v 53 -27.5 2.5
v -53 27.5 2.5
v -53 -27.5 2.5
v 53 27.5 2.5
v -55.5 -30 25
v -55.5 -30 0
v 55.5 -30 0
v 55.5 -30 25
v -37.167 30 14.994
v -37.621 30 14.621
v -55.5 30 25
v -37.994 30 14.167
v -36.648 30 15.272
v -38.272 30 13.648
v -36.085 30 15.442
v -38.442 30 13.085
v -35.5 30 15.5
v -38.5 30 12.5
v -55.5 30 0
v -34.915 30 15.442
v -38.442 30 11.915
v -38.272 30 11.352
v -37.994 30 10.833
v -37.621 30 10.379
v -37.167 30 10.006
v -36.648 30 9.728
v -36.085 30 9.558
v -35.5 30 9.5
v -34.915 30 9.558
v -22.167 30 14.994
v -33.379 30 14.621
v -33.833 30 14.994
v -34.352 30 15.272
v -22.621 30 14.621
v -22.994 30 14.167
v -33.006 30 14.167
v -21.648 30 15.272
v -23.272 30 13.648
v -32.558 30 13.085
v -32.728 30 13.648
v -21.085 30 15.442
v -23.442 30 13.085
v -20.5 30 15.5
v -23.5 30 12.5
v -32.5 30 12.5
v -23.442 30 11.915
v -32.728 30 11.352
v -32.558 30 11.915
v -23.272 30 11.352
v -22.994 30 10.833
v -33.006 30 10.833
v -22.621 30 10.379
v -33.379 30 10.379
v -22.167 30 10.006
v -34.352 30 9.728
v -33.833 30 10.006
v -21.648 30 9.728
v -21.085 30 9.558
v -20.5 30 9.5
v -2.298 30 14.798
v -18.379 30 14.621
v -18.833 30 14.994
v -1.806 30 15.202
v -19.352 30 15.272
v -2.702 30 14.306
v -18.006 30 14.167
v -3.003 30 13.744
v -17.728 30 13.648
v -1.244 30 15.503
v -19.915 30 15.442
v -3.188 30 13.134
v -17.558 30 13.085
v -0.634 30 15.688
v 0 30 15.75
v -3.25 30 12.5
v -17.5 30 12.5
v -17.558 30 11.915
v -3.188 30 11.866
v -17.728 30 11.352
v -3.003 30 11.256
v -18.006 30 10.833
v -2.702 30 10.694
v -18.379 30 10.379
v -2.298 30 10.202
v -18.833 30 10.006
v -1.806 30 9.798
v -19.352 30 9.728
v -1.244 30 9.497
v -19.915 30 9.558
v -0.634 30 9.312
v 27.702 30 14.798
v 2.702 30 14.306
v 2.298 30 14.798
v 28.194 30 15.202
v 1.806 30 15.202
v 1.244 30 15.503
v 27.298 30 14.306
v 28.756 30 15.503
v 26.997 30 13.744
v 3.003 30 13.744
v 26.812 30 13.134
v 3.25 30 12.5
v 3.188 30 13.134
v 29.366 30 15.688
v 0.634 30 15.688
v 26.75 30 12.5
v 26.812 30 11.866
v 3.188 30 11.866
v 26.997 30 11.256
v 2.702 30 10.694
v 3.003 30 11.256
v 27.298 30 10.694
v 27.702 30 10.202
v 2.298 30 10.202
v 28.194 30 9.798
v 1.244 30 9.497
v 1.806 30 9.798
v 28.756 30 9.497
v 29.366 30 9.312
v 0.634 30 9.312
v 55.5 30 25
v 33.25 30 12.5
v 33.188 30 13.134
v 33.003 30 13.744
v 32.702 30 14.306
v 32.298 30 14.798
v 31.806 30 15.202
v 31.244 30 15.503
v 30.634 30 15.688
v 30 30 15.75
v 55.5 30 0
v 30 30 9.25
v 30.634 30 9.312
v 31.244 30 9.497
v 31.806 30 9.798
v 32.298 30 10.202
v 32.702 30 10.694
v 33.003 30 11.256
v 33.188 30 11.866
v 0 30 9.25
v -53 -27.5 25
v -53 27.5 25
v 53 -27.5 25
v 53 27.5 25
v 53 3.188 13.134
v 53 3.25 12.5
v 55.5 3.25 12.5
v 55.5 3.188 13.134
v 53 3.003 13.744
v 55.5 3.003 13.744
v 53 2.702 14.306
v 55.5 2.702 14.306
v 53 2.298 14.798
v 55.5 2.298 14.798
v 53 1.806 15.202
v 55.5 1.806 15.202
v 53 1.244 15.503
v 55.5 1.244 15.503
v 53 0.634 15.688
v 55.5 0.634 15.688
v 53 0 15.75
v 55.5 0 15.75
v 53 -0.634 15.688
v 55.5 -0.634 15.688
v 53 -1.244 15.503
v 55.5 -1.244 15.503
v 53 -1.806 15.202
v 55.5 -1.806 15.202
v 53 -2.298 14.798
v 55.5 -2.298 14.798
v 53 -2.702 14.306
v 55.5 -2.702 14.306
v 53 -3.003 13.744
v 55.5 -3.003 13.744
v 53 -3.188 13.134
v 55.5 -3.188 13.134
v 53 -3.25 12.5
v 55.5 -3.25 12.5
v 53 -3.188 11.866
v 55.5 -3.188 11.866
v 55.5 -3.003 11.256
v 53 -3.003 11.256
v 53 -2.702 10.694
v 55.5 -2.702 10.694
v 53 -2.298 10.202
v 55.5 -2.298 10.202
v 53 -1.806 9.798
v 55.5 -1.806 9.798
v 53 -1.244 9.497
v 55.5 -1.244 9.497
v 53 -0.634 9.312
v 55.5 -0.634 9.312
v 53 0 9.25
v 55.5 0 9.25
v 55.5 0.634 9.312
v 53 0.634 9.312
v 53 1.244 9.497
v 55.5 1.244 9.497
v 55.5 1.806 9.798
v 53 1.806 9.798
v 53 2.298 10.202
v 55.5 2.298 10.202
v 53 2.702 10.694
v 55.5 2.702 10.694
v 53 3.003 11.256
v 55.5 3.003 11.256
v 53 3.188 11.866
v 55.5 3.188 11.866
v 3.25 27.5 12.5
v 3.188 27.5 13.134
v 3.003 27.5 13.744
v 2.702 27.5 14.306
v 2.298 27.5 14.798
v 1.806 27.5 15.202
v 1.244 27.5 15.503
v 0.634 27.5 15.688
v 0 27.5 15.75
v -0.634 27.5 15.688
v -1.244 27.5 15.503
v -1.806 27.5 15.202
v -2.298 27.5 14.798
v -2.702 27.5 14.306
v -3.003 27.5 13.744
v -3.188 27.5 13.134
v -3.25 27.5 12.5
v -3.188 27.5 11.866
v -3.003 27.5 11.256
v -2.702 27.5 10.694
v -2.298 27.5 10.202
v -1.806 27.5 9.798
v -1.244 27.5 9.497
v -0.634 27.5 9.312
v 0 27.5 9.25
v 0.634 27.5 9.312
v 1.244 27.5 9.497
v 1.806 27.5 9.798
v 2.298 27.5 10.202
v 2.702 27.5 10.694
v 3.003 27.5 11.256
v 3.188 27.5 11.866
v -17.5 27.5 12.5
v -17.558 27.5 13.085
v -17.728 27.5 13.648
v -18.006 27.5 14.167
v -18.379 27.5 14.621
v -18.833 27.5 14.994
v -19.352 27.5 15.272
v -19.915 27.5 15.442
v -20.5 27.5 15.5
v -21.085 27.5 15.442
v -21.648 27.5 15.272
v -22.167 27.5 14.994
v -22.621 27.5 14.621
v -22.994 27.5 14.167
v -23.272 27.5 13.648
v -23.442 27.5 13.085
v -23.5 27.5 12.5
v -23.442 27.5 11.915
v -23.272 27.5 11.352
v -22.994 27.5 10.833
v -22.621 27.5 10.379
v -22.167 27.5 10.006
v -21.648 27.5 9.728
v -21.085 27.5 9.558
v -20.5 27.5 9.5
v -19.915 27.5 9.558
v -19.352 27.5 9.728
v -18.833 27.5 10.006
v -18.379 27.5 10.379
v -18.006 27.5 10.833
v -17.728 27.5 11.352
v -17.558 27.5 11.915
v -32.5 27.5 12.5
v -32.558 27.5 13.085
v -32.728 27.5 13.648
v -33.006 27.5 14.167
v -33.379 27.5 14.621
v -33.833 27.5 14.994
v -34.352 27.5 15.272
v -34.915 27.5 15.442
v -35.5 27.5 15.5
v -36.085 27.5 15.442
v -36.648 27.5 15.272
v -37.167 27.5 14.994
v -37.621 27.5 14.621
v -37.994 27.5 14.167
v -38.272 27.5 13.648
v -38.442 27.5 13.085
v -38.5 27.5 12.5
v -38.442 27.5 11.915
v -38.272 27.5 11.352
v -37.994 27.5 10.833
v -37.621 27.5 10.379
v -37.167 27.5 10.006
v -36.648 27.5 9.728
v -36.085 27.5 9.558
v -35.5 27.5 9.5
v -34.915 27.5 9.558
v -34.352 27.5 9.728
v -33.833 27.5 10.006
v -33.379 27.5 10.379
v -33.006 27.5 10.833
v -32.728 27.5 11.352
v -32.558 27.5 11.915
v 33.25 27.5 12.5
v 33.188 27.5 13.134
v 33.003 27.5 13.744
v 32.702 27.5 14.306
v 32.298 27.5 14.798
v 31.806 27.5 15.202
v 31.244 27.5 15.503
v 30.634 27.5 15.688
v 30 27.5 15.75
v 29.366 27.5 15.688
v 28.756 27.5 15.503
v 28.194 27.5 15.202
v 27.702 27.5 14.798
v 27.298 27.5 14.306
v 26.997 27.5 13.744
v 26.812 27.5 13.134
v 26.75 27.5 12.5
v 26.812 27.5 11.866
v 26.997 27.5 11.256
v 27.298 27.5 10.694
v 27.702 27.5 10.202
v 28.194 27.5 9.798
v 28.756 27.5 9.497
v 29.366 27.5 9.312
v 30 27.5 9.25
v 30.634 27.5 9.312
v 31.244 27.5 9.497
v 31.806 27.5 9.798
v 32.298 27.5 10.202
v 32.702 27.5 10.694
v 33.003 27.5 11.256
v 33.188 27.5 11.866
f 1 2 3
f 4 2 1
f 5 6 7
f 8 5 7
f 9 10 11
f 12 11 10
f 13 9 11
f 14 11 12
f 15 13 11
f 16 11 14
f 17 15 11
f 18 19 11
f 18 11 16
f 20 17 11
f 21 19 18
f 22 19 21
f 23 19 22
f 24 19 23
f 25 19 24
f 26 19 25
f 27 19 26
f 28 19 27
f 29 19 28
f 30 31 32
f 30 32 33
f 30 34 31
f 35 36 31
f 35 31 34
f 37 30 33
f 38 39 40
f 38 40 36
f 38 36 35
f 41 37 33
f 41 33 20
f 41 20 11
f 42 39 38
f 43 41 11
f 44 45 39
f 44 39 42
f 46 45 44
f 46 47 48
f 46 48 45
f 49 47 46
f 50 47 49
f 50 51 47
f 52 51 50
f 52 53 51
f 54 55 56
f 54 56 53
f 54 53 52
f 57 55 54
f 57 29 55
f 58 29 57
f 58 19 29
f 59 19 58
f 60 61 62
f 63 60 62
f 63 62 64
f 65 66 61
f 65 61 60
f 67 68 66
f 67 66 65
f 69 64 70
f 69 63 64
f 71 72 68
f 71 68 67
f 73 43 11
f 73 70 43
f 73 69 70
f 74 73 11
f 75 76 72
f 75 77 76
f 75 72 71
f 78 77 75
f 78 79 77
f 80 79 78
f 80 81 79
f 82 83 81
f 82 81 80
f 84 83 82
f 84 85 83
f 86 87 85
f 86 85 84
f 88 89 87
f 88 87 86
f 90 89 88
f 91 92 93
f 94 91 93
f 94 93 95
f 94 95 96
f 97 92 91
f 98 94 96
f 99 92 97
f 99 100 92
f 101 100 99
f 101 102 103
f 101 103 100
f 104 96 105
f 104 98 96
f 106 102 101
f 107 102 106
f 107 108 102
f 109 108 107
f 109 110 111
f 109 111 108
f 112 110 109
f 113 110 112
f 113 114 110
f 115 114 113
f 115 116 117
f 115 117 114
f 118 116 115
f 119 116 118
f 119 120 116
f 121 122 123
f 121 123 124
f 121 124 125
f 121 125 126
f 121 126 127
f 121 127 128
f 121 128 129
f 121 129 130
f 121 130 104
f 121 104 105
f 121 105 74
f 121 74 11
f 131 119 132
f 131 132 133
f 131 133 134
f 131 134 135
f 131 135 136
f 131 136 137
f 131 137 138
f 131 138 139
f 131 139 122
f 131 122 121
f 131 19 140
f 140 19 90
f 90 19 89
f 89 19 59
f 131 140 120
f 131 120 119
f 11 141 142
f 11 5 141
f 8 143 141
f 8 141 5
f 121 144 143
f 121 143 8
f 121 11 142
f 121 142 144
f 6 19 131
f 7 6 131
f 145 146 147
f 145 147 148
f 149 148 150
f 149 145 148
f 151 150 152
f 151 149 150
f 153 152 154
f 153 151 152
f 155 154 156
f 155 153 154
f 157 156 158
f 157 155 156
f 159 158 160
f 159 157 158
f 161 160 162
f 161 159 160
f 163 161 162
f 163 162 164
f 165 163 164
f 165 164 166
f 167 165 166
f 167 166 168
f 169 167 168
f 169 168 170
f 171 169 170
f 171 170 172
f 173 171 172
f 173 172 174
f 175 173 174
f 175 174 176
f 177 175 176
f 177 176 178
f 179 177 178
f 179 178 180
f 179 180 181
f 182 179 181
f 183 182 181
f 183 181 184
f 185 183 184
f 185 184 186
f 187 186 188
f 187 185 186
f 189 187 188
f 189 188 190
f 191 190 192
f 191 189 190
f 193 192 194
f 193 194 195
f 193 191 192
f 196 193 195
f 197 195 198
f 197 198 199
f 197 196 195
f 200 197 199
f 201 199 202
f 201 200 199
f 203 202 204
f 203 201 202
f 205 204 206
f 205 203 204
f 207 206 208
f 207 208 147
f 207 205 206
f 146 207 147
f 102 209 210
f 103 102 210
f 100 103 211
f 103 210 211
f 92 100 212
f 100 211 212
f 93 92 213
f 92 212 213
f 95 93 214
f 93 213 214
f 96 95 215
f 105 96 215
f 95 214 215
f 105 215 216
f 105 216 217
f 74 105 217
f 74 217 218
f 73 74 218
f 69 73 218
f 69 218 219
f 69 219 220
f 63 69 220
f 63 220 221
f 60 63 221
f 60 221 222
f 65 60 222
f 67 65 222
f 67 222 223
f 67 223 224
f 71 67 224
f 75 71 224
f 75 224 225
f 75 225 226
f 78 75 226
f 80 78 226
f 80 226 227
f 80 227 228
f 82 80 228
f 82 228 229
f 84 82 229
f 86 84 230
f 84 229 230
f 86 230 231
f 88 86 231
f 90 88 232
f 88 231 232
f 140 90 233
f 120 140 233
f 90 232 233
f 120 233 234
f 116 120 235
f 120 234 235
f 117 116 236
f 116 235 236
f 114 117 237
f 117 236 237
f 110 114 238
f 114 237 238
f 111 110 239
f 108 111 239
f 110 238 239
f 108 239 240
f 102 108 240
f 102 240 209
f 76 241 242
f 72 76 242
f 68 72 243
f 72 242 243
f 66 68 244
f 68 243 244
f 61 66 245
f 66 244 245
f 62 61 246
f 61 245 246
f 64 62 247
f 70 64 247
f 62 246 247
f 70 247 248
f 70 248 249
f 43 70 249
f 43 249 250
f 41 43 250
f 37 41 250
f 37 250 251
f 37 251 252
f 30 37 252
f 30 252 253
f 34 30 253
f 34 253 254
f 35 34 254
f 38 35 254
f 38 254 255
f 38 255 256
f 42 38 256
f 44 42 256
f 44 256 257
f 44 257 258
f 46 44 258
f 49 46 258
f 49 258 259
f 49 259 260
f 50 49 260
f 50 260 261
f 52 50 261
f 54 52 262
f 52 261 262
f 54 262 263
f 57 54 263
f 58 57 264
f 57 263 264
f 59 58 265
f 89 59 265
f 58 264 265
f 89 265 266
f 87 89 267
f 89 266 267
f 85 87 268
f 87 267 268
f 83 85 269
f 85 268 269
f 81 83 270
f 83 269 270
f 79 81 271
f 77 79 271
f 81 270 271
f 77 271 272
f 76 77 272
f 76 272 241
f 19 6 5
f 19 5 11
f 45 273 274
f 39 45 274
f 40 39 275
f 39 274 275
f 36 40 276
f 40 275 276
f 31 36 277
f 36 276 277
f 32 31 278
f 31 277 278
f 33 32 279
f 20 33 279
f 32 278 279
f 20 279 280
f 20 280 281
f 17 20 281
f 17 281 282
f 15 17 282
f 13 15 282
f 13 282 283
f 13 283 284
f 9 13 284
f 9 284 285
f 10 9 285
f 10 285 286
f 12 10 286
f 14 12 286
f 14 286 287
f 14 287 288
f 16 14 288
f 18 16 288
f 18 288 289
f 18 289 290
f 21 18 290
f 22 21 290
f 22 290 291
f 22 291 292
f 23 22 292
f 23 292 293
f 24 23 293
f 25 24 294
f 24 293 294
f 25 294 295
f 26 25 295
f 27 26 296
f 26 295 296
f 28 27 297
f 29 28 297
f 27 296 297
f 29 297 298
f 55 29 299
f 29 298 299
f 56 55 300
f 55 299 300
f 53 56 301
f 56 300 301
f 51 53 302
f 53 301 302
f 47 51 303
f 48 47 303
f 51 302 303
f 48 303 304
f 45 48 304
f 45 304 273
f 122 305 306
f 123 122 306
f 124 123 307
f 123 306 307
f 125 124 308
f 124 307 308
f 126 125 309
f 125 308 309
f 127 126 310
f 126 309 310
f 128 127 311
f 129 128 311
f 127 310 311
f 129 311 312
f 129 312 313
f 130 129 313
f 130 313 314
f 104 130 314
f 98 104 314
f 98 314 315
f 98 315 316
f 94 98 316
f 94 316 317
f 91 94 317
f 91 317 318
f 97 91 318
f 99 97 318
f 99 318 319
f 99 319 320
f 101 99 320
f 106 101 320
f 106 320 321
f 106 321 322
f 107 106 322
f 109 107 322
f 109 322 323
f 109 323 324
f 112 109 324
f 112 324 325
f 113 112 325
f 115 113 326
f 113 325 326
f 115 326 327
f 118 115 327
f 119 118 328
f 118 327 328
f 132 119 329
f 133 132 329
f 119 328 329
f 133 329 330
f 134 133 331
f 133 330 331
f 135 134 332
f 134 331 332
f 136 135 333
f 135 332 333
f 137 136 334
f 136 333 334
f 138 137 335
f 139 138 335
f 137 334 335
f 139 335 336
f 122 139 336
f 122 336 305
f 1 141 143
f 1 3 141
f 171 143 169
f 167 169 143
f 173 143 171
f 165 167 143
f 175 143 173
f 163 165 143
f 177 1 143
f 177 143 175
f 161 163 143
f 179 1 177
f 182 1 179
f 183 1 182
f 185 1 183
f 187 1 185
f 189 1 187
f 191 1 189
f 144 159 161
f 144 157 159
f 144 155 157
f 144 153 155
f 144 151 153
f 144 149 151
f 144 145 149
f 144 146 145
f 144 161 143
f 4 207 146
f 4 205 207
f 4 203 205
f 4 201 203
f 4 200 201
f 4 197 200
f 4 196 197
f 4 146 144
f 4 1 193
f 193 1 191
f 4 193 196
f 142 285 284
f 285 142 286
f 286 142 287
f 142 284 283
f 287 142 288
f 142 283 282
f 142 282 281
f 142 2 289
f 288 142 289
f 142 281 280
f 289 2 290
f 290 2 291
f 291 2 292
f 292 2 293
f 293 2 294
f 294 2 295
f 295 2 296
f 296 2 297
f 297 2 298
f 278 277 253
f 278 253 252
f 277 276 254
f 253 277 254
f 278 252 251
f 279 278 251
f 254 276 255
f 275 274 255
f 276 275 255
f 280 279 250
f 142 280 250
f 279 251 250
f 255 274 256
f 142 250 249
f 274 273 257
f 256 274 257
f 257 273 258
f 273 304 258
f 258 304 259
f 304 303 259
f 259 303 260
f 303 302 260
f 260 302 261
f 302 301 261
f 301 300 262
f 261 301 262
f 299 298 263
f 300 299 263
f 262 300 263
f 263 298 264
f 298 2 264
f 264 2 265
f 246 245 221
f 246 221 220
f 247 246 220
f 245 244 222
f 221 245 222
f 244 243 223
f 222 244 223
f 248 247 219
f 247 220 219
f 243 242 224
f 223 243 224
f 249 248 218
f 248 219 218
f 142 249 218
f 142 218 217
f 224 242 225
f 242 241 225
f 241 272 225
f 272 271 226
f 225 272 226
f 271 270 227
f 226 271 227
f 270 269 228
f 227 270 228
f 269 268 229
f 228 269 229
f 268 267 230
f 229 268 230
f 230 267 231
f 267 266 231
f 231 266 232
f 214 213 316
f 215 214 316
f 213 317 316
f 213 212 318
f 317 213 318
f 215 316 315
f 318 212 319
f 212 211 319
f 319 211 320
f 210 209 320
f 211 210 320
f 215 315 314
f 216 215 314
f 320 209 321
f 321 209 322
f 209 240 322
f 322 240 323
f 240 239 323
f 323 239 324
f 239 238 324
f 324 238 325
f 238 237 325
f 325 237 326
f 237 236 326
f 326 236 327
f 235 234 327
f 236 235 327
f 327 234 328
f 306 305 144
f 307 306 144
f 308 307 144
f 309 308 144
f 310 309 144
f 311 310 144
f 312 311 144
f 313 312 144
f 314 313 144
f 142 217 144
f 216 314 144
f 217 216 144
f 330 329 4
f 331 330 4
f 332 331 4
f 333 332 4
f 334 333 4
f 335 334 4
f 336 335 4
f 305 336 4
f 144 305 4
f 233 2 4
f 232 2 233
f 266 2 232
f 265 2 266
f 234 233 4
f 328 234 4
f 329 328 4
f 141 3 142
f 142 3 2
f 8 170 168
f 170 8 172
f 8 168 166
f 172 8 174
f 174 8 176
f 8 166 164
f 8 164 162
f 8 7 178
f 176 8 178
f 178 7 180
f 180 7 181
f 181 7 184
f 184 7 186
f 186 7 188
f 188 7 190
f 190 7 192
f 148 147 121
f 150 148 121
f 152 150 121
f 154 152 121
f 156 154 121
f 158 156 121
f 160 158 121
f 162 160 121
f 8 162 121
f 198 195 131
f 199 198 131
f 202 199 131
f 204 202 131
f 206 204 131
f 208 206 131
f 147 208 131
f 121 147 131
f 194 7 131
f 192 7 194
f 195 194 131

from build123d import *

# Parameters (mm, degrees)
F0_W     = 111
F0_H     = 60
F1_DEPTH = 25
F2_T     = -2.5
F3_R     = 3.25
F4_DEPTH = 55.5
F5_R     = 3.25
F6_DEPTH = 30
F7_R     = 3
F8_DEPTH = 30


with BuildPart() as f1:
    # F0 (on Top) → F1 (new body)
    with BuildSketch(Plane.XY):
        Rectangle(F0_W, F0_H)
    extrude(amount=F1_DEPTH)

    # F2
    f2_openings = [f1.faces().sort_by_distance(p)[0] for p in [
        (0, 0, 25),
    ]]
    offset(amount=F2_T, openings=f2_openings)

    # F3 (on Right) → F4 (cut, through all)
    with BuildSketch(Plane.YZ):
        with Locations((0, 12.5)):
            Circle(F3_R)
    extrude(amount=F4_DEPTH, mode=Mode.SUBTRACT)

    # F5 (on Front) → F6 (cut, through all)
    with BuildSketch(Plane.XZ):
        with Locations((0, 12.5)):
            Circle(F5_R)
        with Locations((30, 12.5)):
            Circle(F5_R)
    extrude(amount=-F6_DEPTH, mode=Mode.SUBTRACT)

    # F7 (on Front) → F8 (cut, through all)
    with BuildSketch(Plane.XZ):
        with Locations((-35.5, 12.5)):
            Circle(F7_R)
        with Locations((-20.5, 12.5)):
            Circle(F7_R)
    extrude(amount=-F8_DEPTH, mode=Mode.SUBTRACT)


solid = f1.part
